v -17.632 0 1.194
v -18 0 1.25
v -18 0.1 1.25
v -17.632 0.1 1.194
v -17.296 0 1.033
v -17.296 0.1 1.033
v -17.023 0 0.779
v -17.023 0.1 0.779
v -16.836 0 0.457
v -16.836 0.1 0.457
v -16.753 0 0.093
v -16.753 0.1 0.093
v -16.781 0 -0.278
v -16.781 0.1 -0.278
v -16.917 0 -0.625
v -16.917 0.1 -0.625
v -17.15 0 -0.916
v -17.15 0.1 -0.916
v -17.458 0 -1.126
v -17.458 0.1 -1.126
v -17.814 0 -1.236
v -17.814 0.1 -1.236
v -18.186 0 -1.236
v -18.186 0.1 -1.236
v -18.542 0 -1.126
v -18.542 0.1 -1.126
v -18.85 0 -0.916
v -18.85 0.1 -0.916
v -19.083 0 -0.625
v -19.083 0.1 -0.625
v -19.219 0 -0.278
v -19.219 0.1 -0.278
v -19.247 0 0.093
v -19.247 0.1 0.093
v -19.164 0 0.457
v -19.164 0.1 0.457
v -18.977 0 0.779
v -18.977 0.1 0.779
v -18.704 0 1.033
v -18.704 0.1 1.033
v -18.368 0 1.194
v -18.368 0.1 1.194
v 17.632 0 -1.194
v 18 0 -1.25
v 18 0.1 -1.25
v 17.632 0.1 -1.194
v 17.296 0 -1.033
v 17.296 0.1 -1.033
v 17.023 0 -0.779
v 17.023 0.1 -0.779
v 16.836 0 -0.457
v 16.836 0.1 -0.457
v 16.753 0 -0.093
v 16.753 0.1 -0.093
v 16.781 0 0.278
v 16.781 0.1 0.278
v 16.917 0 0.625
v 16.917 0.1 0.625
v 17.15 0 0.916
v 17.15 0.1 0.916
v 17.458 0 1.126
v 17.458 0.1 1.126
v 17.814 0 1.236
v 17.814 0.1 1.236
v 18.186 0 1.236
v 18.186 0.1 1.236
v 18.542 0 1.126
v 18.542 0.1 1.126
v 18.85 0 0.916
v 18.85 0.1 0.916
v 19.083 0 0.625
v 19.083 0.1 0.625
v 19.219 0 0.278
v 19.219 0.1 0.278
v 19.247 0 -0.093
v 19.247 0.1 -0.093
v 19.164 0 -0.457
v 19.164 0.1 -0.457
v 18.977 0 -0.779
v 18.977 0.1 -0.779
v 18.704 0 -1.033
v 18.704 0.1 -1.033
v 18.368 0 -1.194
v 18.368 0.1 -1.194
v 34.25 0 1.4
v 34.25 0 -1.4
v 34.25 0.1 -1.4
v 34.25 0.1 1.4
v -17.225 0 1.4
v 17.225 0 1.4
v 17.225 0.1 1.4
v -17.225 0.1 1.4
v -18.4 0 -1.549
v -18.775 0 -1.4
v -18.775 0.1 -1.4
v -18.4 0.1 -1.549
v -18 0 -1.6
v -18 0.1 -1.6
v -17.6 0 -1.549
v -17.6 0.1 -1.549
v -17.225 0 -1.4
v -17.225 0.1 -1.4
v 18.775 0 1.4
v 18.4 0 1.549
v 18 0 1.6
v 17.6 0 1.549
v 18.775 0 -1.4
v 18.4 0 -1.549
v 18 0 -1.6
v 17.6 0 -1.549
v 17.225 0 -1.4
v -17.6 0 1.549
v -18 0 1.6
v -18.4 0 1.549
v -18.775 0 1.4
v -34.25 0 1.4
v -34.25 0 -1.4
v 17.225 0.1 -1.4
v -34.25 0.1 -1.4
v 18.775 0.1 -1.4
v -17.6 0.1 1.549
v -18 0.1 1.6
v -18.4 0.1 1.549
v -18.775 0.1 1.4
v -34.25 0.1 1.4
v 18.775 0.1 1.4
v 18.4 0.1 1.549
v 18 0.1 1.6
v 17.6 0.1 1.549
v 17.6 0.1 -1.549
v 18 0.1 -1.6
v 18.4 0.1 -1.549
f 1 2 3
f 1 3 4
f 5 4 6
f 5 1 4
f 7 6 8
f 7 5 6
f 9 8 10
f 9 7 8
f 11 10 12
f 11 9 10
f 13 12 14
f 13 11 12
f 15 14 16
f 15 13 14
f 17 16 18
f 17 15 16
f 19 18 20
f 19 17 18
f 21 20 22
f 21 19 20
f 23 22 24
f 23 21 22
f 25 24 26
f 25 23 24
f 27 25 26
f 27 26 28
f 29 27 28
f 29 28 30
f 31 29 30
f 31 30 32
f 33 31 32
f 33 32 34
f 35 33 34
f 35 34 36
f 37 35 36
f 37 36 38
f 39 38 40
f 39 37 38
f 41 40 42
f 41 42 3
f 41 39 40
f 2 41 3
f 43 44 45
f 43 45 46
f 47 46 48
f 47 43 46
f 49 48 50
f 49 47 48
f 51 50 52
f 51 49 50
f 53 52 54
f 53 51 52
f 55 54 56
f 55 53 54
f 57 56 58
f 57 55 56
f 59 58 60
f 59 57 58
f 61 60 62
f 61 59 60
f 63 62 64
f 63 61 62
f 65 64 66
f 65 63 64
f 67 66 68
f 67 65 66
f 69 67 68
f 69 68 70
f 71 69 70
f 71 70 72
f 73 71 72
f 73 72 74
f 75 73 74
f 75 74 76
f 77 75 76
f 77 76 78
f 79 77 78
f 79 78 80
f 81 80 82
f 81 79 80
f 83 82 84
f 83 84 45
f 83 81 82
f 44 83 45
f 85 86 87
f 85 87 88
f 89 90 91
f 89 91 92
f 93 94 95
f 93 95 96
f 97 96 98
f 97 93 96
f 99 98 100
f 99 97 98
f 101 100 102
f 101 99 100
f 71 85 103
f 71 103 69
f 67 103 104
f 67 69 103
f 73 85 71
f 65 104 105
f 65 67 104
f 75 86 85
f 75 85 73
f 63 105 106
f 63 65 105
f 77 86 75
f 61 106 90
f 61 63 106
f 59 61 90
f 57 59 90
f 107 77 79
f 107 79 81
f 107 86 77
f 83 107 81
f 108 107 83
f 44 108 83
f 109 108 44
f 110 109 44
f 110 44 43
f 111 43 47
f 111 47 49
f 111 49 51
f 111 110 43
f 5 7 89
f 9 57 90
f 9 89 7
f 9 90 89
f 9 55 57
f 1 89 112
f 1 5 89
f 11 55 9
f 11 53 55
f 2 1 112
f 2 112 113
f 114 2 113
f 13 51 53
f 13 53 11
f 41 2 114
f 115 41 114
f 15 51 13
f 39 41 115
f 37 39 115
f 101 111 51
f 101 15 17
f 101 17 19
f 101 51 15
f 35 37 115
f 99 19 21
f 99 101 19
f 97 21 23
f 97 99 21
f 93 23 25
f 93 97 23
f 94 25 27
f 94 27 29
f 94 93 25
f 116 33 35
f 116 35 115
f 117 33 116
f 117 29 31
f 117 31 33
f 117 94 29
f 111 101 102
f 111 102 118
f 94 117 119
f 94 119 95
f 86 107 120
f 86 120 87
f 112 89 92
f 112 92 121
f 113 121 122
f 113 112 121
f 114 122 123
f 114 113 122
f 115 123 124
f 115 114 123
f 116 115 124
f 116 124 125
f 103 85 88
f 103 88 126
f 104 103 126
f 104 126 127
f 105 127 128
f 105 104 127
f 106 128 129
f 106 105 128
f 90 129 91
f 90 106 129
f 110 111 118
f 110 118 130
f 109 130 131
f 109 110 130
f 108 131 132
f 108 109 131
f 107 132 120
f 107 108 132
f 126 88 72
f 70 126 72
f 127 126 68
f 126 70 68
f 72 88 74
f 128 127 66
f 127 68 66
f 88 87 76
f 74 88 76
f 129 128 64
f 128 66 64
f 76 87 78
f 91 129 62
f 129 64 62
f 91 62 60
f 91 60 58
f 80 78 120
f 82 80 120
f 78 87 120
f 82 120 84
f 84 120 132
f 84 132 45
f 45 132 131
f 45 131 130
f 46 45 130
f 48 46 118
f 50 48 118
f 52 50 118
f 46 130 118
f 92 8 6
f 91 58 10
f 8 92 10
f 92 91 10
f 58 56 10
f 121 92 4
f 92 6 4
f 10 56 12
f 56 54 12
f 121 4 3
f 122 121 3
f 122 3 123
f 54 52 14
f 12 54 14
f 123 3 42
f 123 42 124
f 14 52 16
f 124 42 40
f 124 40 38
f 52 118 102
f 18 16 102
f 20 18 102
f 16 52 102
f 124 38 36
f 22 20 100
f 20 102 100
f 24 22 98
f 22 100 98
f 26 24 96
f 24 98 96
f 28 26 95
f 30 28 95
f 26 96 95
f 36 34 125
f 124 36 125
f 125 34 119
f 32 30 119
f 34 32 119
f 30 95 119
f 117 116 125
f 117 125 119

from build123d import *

# Parameters (mm, degrees)
SKETCH1_R           = 1.25
BOSS_EXTRUDE1_DEPTH = 0.1


with BuildPart() as part:
    # Sketch1 → Boss-Extrude1 (new body)
    with BuildSketch(Plane(origin=(0, 0, 0), x_dir=(1, 0, 0), z_dir=(0, 1, 0))):
        with BuildLine():
            Line((-34.25, 1.4), (-18.774596669, 1.4))
            ThreePointArc((-18.774596669, 1.4), (-18, 1.6), (-17.225403331, 1.4))
            Line((-17.225403331, 1.4), (17.225403331, 1.4))
            ThreePointArc((17.225403331, 1.4), (18, 1.6), (18.774596669, 1.4))
            Line((18.774596669, 1.4), (34.25, 1.4))
            Line((34.25, 1.4), (34.25, -1.4))
            Line((34.25, -1.4), (18.774596669, -1.4))
            ThreePointArc((18.774596669, -1.4), (18, -1.6), (17.225403331, -1.4))
            Line((17.225403331, -1.4), (-17.225403331, -1.4))
            ThreePointArc((-17.225403331, -1.4), (-18, -1.6), (-18.774596669, -1.4))
            Line((-18.774596669, -1.4), (-34.25, -1.4))
            Line((-34.25, -1.4), (-34.25, 1.4))
        make_face()
        with Locations(Location((-18, 0, 0), (0, 0, 270))):
            Circle(SKETCH1_R, mode=Mode.SUBTRACT)
        with Locations(Location((18, 0, 0), (0, 0, 90))):
            Circle(SKETCH1_R, mode=Mode.SUBTRACT)
    extrude(amount=BOSS_EXTRUDE1_DEPTH)


solid = part.part
